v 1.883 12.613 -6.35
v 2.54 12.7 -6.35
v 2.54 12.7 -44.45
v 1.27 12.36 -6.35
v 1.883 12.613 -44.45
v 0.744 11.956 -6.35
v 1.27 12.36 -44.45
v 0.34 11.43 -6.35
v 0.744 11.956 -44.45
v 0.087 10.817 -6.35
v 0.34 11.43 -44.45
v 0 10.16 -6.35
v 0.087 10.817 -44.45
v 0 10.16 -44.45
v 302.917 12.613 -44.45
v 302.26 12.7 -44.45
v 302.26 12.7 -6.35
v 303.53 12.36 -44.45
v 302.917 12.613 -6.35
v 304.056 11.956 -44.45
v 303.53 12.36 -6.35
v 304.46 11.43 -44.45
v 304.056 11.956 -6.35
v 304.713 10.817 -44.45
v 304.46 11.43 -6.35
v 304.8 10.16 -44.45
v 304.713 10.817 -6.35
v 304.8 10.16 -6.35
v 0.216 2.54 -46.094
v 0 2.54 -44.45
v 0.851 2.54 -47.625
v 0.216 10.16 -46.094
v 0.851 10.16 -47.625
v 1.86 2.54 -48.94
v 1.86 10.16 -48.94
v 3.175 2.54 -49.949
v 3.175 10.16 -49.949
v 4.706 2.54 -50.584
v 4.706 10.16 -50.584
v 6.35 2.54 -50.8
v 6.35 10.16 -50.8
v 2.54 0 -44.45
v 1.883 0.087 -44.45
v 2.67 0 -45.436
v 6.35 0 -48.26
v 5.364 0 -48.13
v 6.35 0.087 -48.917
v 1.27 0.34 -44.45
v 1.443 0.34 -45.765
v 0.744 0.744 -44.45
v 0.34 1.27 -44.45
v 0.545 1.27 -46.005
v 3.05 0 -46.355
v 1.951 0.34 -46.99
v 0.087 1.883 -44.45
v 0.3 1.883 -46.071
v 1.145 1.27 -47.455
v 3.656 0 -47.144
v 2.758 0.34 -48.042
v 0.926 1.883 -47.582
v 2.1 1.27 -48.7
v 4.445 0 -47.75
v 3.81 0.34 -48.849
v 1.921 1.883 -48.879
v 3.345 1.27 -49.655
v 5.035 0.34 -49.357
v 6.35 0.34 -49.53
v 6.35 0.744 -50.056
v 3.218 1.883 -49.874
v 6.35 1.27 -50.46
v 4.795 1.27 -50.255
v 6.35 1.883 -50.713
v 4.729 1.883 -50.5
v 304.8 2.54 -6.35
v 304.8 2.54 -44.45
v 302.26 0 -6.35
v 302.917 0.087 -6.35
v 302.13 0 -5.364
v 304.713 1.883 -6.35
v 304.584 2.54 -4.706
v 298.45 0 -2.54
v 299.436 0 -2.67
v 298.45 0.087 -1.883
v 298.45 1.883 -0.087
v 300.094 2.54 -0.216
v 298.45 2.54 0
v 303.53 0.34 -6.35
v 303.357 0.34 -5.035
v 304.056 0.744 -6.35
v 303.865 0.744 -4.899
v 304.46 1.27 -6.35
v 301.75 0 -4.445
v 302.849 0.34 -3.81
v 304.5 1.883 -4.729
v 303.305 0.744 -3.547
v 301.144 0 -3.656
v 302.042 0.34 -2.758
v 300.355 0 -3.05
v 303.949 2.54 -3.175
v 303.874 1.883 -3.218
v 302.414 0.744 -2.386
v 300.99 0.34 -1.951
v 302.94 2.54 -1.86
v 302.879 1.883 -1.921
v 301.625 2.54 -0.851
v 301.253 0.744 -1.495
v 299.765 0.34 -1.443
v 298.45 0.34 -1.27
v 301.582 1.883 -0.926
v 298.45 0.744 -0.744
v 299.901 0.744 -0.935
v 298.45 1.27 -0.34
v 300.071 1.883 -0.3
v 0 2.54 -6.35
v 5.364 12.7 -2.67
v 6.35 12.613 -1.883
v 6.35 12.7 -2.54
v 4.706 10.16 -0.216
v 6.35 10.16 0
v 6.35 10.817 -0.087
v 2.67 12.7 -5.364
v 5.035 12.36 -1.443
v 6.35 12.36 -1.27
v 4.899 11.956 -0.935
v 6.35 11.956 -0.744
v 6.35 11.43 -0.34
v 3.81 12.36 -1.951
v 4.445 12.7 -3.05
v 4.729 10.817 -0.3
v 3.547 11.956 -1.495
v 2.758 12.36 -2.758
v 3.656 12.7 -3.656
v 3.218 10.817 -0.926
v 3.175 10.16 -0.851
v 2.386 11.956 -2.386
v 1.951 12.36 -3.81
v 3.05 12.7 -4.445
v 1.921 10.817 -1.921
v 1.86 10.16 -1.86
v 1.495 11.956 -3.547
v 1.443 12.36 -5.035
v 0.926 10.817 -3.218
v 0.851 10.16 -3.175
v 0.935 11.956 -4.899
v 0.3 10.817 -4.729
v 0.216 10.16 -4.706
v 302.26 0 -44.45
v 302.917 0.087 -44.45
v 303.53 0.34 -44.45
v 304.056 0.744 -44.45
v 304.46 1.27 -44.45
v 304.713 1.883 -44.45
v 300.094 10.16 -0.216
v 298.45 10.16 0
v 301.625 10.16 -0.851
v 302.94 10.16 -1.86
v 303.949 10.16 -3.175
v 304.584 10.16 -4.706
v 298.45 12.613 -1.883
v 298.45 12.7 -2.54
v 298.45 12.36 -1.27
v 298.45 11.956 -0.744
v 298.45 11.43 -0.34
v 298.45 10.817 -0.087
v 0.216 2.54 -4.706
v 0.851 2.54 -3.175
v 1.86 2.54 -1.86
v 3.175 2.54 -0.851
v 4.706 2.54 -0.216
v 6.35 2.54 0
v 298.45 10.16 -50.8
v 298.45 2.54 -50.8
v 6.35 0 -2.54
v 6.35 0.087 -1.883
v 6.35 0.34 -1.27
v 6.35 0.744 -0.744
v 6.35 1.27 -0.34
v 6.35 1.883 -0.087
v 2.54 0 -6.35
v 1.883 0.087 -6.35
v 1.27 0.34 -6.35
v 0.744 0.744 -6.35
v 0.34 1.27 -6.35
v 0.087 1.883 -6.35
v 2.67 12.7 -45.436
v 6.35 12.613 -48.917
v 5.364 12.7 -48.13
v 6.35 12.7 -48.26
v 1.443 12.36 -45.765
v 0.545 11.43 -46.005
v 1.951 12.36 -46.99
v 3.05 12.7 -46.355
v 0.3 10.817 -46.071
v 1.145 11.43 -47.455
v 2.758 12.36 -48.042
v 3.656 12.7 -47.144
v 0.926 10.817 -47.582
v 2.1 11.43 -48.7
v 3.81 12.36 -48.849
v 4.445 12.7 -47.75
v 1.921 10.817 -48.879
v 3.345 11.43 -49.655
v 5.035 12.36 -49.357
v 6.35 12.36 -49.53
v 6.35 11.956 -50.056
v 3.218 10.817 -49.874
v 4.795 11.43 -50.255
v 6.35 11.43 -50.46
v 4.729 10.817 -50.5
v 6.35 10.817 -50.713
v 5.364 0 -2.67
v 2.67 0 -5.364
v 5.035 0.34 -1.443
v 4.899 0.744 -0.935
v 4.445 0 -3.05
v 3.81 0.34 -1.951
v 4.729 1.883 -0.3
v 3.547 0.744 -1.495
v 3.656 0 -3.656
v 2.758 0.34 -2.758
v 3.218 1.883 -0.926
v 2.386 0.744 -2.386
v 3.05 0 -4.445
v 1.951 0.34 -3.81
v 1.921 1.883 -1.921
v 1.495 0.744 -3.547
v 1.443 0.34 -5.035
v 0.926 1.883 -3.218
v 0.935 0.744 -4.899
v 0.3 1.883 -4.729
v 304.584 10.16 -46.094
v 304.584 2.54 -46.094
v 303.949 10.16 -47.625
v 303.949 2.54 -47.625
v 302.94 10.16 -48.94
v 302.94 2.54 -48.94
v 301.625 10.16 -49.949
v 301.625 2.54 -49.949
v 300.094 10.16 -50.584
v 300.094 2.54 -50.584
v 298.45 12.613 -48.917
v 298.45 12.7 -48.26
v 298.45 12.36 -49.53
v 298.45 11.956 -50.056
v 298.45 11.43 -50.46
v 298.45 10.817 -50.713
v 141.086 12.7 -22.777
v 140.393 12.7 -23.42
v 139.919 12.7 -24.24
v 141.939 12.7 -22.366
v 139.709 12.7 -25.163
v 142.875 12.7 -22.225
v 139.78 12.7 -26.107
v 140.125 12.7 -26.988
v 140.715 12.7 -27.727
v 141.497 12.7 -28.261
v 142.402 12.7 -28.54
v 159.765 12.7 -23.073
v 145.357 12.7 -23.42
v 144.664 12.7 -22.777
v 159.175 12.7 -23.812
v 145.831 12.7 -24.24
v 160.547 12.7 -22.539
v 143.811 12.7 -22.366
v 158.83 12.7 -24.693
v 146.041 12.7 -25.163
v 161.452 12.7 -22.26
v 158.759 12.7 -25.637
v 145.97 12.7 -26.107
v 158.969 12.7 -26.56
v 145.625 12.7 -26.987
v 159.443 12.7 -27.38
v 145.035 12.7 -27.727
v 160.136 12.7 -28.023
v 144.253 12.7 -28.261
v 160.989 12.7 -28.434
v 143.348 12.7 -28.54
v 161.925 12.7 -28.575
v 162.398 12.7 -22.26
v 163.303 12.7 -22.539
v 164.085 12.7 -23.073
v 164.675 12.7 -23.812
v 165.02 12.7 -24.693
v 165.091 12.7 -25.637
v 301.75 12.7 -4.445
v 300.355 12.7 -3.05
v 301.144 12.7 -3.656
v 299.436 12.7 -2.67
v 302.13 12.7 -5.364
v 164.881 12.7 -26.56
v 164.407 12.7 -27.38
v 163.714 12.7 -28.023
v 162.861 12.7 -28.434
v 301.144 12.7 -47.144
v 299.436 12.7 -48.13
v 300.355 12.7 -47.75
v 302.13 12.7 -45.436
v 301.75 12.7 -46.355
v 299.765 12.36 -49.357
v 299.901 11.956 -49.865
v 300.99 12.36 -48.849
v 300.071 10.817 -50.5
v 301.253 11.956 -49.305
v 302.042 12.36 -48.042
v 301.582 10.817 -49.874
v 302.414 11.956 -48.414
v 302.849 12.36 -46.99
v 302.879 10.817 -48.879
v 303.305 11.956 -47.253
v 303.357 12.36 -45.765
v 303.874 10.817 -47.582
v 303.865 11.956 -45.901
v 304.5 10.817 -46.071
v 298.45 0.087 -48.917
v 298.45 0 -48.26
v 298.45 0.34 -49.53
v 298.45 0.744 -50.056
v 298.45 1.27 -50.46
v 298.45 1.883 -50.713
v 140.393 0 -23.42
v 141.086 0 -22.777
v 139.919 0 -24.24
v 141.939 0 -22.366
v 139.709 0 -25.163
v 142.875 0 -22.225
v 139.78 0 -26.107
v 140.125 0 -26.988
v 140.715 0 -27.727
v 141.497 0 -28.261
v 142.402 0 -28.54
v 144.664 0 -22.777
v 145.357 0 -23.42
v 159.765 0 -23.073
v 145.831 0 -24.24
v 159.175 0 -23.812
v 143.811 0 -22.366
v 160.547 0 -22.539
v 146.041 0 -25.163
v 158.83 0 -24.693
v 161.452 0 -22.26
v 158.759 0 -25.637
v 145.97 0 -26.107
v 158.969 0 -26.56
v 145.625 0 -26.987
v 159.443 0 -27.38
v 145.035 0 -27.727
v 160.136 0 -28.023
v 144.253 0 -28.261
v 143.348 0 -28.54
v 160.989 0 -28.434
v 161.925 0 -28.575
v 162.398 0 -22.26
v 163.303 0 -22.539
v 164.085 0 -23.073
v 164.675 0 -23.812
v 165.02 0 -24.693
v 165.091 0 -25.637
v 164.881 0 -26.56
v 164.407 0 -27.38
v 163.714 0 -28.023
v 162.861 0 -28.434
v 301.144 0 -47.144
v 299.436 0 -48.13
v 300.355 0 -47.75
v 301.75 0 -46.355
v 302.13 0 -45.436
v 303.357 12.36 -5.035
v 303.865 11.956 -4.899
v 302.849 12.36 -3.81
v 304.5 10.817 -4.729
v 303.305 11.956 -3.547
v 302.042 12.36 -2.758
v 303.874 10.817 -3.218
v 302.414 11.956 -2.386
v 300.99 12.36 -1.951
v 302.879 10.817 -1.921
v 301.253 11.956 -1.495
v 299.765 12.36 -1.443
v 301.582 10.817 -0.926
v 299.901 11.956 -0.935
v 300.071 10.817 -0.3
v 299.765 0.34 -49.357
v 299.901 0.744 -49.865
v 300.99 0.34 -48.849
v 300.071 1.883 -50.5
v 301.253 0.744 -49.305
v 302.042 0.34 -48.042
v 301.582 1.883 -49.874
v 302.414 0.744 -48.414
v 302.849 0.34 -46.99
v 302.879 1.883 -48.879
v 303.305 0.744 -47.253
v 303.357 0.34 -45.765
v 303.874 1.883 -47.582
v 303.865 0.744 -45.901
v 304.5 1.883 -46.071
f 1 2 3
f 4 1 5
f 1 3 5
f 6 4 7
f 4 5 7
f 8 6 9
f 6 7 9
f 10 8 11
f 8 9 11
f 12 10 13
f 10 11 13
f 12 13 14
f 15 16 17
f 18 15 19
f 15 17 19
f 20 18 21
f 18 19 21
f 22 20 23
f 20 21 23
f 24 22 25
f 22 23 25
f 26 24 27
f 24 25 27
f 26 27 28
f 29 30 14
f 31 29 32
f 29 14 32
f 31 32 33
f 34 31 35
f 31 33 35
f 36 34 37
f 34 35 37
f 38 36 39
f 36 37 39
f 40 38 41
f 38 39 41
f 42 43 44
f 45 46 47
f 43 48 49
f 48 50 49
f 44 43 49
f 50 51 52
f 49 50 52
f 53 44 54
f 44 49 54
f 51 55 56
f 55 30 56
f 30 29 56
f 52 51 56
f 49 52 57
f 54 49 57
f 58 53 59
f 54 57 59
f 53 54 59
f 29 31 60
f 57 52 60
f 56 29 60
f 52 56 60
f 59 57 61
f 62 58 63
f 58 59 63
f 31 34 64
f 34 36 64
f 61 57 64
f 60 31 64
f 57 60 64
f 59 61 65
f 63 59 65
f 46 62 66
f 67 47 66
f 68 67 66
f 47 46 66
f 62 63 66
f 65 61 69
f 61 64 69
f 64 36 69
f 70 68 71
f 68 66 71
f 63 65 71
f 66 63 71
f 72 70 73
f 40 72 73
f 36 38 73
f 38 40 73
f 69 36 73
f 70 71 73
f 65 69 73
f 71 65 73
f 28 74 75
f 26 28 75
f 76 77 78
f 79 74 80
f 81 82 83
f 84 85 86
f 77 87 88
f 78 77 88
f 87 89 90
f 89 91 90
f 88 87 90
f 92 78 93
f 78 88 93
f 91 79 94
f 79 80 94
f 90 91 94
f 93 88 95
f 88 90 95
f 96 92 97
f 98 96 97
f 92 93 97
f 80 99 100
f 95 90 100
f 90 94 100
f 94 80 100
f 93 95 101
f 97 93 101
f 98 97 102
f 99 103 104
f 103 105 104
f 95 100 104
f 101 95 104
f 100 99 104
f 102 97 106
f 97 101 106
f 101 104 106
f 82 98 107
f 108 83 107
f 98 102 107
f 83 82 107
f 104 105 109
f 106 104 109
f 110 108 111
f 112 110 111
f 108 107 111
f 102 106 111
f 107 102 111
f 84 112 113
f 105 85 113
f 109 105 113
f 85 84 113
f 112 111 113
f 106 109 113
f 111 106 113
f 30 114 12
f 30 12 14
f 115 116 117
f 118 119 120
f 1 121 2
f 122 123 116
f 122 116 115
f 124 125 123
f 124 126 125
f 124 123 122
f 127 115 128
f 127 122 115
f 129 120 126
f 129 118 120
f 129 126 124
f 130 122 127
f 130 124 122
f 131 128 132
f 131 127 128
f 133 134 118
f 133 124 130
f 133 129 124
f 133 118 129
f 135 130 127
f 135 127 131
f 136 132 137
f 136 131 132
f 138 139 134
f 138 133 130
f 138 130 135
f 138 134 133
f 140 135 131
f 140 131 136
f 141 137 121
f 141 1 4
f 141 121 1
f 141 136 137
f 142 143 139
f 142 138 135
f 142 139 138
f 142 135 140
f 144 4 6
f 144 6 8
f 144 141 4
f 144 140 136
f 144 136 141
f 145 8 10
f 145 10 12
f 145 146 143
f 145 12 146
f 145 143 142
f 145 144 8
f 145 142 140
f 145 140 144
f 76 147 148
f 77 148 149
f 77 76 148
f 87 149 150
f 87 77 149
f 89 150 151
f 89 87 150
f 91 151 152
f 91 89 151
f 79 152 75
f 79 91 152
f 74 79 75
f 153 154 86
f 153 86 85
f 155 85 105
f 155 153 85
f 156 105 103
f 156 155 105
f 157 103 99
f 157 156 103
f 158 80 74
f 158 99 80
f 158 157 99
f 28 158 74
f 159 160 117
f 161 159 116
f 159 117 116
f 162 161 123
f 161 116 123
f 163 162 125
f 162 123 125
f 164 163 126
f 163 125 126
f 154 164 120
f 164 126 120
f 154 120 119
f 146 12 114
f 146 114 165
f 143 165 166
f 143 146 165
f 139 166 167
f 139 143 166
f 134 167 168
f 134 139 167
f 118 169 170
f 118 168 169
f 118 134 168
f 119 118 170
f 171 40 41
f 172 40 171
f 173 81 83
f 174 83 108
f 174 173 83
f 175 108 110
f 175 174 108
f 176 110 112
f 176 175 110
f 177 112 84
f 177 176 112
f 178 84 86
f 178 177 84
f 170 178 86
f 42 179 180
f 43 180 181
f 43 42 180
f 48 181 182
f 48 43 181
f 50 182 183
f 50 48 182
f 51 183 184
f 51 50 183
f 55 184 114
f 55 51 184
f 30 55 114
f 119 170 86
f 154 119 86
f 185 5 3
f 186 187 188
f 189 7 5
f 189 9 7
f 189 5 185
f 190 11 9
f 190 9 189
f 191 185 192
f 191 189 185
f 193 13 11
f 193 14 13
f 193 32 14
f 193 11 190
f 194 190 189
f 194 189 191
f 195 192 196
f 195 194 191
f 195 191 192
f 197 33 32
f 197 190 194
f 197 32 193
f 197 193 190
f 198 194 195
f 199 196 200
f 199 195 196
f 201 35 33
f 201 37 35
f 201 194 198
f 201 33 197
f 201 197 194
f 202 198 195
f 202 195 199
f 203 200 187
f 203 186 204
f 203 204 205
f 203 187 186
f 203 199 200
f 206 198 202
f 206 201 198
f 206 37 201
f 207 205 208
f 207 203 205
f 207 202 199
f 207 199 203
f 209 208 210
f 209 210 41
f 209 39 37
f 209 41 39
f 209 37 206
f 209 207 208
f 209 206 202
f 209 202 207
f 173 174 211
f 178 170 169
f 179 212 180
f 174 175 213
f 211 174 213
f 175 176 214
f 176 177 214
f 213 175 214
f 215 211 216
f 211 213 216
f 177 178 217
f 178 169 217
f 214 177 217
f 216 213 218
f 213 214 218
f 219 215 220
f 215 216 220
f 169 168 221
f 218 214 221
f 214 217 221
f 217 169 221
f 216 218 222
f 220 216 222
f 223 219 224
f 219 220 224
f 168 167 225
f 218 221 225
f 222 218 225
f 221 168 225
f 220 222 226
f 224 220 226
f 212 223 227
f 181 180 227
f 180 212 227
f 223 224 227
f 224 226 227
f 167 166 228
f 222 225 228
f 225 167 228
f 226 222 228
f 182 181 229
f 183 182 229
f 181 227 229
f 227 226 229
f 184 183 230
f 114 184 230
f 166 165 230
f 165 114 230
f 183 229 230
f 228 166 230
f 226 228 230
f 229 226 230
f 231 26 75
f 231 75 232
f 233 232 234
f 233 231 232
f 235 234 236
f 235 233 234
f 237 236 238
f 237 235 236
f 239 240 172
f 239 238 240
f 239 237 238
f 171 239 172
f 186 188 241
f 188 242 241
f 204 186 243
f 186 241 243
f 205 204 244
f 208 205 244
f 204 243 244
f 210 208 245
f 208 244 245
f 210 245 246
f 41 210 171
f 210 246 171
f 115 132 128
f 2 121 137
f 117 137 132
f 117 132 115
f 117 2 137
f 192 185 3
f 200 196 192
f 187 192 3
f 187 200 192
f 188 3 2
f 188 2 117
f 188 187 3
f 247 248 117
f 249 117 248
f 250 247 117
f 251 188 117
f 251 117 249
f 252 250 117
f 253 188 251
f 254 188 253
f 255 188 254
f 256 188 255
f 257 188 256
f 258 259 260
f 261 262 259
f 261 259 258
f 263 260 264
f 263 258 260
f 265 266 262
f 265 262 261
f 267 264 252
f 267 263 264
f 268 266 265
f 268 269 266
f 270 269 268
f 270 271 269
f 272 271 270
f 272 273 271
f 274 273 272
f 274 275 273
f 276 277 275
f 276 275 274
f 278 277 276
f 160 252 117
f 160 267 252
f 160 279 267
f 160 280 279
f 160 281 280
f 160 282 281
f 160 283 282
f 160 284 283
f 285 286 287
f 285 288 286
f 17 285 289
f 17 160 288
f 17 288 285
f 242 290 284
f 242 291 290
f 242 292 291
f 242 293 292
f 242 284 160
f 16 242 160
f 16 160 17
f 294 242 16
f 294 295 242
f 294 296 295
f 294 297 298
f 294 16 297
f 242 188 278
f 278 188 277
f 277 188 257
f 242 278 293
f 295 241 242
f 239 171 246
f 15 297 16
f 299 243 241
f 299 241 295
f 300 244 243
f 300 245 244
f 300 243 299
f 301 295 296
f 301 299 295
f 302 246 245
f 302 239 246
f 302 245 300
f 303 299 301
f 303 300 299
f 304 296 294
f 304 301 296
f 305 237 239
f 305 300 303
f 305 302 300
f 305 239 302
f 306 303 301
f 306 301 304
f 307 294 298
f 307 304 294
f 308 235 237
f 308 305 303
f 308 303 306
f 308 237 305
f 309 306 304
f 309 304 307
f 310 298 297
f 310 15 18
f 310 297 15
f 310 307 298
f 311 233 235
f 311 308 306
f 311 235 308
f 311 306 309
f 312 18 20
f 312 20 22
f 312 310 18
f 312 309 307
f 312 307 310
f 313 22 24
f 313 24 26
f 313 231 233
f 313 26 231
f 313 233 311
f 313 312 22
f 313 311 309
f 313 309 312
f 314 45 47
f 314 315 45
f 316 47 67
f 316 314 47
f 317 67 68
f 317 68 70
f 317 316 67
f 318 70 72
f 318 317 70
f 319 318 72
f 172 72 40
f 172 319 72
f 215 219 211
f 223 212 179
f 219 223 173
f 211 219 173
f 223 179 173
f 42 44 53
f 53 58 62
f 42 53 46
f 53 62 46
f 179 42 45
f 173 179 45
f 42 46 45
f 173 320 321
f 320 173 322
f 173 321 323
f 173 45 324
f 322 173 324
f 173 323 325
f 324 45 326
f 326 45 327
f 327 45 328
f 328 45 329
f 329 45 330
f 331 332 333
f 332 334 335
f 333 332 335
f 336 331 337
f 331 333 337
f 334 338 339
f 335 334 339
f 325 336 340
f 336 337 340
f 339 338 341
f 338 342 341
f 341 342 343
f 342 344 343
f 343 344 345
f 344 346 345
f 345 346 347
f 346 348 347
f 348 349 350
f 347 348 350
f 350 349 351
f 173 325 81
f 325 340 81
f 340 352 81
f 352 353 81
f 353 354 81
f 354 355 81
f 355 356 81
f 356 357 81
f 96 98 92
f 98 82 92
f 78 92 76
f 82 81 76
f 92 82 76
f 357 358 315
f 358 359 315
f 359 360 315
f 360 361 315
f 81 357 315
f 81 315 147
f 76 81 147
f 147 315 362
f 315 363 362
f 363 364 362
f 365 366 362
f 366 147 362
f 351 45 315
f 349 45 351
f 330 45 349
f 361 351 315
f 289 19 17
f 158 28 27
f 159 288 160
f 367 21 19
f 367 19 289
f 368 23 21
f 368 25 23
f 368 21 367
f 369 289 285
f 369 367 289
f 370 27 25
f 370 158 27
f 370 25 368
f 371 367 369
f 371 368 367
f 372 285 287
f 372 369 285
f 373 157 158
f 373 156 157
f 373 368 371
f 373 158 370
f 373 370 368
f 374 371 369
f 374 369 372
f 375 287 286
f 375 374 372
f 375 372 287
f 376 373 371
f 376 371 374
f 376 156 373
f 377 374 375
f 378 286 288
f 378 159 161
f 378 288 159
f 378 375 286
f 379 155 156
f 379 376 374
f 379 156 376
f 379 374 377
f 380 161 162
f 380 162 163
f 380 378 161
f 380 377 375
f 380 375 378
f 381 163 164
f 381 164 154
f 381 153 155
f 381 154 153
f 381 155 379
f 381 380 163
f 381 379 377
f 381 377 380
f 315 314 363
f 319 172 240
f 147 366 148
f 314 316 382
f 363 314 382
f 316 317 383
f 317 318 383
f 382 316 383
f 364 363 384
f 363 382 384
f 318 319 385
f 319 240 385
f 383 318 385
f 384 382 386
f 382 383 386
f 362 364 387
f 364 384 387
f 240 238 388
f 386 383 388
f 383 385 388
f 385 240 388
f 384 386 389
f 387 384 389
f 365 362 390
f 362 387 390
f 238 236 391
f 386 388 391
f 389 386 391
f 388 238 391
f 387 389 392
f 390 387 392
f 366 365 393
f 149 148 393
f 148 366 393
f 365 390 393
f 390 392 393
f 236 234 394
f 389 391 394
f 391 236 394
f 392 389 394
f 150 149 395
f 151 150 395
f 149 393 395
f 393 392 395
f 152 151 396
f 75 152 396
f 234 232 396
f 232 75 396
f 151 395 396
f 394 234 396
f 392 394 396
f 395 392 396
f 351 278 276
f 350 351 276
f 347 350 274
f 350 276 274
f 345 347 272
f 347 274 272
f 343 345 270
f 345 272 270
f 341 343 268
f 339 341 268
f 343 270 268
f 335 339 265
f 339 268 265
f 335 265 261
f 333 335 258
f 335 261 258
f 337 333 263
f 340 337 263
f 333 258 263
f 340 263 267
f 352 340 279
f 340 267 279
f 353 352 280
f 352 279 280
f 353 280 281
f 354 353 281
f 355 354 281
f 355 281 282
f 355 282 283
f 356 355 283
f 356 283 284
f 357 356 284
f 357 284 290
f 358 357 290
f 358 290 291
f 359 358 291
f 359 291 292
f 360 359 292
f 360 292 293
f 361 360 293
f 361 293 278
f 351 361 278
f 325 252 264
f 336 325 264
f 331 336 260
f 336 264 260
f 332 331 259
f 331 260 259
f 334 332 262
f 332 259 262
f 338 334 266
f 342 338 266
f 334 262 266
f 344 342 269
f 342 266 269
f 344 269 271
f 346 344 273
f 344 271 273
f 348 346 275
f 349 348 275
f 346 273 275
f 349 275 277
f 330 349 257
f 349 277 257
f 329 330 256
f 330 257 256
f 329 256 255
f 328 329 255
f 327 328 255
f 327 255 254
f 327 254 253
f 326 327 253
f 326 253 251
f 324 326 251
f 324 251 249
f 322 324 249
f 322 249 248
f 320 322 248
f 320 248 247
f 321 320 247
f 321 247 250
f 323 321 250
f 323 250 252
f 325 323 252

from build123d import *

# Parameters (mm, degrees)
SKETCH1_W           = 304.8
SKETCH1_H           = 50.8
BOSS_EXTRUDE1_DEPTH = 12.7
FILLET1_R           = 6.35
FILLET2_R           = 2.54
SKETCH2_R           = 3.175
CUT_EXTRUDE1_DEPTH  = 310.265209812


with BuildPart() as part:
    # Sketch1 → Boss-Extrude1 (new body)
    with BuildSketch(Plane(origin=(0, 0, 0), x_dir=(1, 0, 0), z_dir=(0, 1, 0))):
        with Locations((152.4, 25.4)):
            Rectangle(SKETCH1_W, SKETCH1_H)
    extrude(amount=BOSS_EXTRUDE1_DEPTH)

    # Fillet1
    fillet1_edges = [part.edges().sort_by_distance(p)[0] for p in [
        (0, 6.35, -50.8),
        (304.8, 6.35, -50.8),
        (304.8, 6.35, 0),
        (0, 6.35, 0),
    ]]
    fillet(fillet1_edges, radius=FILLET1_R)

    # Fillet2
    fillet2_edges = [part.edges().sort_by_distance(p)[0] for p in [
        (152.4, 0, -50.8),
        (152.4, 12.7, -50.8),
        (0, 0, -25.4),
        (304.8, 0, -25.4),
        (152.4, 0, 0),
        (1.859871939, 0, -1.859871939),
        (1.859871939, 0, -48.940128061),
        (302.940128061, 0, -1.859871939),
        (302.940128061, 0, -48.940128061),
        (304.8, 12.7, -25.4),
        (0, 12.7, -25.4),
        (152.4, 12.7, 0),
        (1.859871939, 12.7, -1.859871939),
        (1.859871939, 12.7, -48.940128061),
        (302.940128061, 12.7, -1.859871939),
        (302.940128061, 12.7, -48.940128061),
    ]]
    fillet(fillet2_edges, radius=FILLET2_R)

    # Sketch2 → Cut-Extrude1 (cut, through all)
    with BuildSketch(Plane(origin=(0, 12.7, 0), x_dir=(1, 0, 0), z_dir=(0, 1, 0))):
        with Locations(Location((142.875, 25.4, 0), (0, 0, 270))):
            Circle(SKETCH2_R)
        with Locations(Location((161.925, 25.4, 0), (0, 0, 90))):
            Circle(SKETCH2_R)
    extrude(amount=-CUT_EXTRUDE1_DEPTH, mode=Mode.SUBTRACT)


solid = part.part
